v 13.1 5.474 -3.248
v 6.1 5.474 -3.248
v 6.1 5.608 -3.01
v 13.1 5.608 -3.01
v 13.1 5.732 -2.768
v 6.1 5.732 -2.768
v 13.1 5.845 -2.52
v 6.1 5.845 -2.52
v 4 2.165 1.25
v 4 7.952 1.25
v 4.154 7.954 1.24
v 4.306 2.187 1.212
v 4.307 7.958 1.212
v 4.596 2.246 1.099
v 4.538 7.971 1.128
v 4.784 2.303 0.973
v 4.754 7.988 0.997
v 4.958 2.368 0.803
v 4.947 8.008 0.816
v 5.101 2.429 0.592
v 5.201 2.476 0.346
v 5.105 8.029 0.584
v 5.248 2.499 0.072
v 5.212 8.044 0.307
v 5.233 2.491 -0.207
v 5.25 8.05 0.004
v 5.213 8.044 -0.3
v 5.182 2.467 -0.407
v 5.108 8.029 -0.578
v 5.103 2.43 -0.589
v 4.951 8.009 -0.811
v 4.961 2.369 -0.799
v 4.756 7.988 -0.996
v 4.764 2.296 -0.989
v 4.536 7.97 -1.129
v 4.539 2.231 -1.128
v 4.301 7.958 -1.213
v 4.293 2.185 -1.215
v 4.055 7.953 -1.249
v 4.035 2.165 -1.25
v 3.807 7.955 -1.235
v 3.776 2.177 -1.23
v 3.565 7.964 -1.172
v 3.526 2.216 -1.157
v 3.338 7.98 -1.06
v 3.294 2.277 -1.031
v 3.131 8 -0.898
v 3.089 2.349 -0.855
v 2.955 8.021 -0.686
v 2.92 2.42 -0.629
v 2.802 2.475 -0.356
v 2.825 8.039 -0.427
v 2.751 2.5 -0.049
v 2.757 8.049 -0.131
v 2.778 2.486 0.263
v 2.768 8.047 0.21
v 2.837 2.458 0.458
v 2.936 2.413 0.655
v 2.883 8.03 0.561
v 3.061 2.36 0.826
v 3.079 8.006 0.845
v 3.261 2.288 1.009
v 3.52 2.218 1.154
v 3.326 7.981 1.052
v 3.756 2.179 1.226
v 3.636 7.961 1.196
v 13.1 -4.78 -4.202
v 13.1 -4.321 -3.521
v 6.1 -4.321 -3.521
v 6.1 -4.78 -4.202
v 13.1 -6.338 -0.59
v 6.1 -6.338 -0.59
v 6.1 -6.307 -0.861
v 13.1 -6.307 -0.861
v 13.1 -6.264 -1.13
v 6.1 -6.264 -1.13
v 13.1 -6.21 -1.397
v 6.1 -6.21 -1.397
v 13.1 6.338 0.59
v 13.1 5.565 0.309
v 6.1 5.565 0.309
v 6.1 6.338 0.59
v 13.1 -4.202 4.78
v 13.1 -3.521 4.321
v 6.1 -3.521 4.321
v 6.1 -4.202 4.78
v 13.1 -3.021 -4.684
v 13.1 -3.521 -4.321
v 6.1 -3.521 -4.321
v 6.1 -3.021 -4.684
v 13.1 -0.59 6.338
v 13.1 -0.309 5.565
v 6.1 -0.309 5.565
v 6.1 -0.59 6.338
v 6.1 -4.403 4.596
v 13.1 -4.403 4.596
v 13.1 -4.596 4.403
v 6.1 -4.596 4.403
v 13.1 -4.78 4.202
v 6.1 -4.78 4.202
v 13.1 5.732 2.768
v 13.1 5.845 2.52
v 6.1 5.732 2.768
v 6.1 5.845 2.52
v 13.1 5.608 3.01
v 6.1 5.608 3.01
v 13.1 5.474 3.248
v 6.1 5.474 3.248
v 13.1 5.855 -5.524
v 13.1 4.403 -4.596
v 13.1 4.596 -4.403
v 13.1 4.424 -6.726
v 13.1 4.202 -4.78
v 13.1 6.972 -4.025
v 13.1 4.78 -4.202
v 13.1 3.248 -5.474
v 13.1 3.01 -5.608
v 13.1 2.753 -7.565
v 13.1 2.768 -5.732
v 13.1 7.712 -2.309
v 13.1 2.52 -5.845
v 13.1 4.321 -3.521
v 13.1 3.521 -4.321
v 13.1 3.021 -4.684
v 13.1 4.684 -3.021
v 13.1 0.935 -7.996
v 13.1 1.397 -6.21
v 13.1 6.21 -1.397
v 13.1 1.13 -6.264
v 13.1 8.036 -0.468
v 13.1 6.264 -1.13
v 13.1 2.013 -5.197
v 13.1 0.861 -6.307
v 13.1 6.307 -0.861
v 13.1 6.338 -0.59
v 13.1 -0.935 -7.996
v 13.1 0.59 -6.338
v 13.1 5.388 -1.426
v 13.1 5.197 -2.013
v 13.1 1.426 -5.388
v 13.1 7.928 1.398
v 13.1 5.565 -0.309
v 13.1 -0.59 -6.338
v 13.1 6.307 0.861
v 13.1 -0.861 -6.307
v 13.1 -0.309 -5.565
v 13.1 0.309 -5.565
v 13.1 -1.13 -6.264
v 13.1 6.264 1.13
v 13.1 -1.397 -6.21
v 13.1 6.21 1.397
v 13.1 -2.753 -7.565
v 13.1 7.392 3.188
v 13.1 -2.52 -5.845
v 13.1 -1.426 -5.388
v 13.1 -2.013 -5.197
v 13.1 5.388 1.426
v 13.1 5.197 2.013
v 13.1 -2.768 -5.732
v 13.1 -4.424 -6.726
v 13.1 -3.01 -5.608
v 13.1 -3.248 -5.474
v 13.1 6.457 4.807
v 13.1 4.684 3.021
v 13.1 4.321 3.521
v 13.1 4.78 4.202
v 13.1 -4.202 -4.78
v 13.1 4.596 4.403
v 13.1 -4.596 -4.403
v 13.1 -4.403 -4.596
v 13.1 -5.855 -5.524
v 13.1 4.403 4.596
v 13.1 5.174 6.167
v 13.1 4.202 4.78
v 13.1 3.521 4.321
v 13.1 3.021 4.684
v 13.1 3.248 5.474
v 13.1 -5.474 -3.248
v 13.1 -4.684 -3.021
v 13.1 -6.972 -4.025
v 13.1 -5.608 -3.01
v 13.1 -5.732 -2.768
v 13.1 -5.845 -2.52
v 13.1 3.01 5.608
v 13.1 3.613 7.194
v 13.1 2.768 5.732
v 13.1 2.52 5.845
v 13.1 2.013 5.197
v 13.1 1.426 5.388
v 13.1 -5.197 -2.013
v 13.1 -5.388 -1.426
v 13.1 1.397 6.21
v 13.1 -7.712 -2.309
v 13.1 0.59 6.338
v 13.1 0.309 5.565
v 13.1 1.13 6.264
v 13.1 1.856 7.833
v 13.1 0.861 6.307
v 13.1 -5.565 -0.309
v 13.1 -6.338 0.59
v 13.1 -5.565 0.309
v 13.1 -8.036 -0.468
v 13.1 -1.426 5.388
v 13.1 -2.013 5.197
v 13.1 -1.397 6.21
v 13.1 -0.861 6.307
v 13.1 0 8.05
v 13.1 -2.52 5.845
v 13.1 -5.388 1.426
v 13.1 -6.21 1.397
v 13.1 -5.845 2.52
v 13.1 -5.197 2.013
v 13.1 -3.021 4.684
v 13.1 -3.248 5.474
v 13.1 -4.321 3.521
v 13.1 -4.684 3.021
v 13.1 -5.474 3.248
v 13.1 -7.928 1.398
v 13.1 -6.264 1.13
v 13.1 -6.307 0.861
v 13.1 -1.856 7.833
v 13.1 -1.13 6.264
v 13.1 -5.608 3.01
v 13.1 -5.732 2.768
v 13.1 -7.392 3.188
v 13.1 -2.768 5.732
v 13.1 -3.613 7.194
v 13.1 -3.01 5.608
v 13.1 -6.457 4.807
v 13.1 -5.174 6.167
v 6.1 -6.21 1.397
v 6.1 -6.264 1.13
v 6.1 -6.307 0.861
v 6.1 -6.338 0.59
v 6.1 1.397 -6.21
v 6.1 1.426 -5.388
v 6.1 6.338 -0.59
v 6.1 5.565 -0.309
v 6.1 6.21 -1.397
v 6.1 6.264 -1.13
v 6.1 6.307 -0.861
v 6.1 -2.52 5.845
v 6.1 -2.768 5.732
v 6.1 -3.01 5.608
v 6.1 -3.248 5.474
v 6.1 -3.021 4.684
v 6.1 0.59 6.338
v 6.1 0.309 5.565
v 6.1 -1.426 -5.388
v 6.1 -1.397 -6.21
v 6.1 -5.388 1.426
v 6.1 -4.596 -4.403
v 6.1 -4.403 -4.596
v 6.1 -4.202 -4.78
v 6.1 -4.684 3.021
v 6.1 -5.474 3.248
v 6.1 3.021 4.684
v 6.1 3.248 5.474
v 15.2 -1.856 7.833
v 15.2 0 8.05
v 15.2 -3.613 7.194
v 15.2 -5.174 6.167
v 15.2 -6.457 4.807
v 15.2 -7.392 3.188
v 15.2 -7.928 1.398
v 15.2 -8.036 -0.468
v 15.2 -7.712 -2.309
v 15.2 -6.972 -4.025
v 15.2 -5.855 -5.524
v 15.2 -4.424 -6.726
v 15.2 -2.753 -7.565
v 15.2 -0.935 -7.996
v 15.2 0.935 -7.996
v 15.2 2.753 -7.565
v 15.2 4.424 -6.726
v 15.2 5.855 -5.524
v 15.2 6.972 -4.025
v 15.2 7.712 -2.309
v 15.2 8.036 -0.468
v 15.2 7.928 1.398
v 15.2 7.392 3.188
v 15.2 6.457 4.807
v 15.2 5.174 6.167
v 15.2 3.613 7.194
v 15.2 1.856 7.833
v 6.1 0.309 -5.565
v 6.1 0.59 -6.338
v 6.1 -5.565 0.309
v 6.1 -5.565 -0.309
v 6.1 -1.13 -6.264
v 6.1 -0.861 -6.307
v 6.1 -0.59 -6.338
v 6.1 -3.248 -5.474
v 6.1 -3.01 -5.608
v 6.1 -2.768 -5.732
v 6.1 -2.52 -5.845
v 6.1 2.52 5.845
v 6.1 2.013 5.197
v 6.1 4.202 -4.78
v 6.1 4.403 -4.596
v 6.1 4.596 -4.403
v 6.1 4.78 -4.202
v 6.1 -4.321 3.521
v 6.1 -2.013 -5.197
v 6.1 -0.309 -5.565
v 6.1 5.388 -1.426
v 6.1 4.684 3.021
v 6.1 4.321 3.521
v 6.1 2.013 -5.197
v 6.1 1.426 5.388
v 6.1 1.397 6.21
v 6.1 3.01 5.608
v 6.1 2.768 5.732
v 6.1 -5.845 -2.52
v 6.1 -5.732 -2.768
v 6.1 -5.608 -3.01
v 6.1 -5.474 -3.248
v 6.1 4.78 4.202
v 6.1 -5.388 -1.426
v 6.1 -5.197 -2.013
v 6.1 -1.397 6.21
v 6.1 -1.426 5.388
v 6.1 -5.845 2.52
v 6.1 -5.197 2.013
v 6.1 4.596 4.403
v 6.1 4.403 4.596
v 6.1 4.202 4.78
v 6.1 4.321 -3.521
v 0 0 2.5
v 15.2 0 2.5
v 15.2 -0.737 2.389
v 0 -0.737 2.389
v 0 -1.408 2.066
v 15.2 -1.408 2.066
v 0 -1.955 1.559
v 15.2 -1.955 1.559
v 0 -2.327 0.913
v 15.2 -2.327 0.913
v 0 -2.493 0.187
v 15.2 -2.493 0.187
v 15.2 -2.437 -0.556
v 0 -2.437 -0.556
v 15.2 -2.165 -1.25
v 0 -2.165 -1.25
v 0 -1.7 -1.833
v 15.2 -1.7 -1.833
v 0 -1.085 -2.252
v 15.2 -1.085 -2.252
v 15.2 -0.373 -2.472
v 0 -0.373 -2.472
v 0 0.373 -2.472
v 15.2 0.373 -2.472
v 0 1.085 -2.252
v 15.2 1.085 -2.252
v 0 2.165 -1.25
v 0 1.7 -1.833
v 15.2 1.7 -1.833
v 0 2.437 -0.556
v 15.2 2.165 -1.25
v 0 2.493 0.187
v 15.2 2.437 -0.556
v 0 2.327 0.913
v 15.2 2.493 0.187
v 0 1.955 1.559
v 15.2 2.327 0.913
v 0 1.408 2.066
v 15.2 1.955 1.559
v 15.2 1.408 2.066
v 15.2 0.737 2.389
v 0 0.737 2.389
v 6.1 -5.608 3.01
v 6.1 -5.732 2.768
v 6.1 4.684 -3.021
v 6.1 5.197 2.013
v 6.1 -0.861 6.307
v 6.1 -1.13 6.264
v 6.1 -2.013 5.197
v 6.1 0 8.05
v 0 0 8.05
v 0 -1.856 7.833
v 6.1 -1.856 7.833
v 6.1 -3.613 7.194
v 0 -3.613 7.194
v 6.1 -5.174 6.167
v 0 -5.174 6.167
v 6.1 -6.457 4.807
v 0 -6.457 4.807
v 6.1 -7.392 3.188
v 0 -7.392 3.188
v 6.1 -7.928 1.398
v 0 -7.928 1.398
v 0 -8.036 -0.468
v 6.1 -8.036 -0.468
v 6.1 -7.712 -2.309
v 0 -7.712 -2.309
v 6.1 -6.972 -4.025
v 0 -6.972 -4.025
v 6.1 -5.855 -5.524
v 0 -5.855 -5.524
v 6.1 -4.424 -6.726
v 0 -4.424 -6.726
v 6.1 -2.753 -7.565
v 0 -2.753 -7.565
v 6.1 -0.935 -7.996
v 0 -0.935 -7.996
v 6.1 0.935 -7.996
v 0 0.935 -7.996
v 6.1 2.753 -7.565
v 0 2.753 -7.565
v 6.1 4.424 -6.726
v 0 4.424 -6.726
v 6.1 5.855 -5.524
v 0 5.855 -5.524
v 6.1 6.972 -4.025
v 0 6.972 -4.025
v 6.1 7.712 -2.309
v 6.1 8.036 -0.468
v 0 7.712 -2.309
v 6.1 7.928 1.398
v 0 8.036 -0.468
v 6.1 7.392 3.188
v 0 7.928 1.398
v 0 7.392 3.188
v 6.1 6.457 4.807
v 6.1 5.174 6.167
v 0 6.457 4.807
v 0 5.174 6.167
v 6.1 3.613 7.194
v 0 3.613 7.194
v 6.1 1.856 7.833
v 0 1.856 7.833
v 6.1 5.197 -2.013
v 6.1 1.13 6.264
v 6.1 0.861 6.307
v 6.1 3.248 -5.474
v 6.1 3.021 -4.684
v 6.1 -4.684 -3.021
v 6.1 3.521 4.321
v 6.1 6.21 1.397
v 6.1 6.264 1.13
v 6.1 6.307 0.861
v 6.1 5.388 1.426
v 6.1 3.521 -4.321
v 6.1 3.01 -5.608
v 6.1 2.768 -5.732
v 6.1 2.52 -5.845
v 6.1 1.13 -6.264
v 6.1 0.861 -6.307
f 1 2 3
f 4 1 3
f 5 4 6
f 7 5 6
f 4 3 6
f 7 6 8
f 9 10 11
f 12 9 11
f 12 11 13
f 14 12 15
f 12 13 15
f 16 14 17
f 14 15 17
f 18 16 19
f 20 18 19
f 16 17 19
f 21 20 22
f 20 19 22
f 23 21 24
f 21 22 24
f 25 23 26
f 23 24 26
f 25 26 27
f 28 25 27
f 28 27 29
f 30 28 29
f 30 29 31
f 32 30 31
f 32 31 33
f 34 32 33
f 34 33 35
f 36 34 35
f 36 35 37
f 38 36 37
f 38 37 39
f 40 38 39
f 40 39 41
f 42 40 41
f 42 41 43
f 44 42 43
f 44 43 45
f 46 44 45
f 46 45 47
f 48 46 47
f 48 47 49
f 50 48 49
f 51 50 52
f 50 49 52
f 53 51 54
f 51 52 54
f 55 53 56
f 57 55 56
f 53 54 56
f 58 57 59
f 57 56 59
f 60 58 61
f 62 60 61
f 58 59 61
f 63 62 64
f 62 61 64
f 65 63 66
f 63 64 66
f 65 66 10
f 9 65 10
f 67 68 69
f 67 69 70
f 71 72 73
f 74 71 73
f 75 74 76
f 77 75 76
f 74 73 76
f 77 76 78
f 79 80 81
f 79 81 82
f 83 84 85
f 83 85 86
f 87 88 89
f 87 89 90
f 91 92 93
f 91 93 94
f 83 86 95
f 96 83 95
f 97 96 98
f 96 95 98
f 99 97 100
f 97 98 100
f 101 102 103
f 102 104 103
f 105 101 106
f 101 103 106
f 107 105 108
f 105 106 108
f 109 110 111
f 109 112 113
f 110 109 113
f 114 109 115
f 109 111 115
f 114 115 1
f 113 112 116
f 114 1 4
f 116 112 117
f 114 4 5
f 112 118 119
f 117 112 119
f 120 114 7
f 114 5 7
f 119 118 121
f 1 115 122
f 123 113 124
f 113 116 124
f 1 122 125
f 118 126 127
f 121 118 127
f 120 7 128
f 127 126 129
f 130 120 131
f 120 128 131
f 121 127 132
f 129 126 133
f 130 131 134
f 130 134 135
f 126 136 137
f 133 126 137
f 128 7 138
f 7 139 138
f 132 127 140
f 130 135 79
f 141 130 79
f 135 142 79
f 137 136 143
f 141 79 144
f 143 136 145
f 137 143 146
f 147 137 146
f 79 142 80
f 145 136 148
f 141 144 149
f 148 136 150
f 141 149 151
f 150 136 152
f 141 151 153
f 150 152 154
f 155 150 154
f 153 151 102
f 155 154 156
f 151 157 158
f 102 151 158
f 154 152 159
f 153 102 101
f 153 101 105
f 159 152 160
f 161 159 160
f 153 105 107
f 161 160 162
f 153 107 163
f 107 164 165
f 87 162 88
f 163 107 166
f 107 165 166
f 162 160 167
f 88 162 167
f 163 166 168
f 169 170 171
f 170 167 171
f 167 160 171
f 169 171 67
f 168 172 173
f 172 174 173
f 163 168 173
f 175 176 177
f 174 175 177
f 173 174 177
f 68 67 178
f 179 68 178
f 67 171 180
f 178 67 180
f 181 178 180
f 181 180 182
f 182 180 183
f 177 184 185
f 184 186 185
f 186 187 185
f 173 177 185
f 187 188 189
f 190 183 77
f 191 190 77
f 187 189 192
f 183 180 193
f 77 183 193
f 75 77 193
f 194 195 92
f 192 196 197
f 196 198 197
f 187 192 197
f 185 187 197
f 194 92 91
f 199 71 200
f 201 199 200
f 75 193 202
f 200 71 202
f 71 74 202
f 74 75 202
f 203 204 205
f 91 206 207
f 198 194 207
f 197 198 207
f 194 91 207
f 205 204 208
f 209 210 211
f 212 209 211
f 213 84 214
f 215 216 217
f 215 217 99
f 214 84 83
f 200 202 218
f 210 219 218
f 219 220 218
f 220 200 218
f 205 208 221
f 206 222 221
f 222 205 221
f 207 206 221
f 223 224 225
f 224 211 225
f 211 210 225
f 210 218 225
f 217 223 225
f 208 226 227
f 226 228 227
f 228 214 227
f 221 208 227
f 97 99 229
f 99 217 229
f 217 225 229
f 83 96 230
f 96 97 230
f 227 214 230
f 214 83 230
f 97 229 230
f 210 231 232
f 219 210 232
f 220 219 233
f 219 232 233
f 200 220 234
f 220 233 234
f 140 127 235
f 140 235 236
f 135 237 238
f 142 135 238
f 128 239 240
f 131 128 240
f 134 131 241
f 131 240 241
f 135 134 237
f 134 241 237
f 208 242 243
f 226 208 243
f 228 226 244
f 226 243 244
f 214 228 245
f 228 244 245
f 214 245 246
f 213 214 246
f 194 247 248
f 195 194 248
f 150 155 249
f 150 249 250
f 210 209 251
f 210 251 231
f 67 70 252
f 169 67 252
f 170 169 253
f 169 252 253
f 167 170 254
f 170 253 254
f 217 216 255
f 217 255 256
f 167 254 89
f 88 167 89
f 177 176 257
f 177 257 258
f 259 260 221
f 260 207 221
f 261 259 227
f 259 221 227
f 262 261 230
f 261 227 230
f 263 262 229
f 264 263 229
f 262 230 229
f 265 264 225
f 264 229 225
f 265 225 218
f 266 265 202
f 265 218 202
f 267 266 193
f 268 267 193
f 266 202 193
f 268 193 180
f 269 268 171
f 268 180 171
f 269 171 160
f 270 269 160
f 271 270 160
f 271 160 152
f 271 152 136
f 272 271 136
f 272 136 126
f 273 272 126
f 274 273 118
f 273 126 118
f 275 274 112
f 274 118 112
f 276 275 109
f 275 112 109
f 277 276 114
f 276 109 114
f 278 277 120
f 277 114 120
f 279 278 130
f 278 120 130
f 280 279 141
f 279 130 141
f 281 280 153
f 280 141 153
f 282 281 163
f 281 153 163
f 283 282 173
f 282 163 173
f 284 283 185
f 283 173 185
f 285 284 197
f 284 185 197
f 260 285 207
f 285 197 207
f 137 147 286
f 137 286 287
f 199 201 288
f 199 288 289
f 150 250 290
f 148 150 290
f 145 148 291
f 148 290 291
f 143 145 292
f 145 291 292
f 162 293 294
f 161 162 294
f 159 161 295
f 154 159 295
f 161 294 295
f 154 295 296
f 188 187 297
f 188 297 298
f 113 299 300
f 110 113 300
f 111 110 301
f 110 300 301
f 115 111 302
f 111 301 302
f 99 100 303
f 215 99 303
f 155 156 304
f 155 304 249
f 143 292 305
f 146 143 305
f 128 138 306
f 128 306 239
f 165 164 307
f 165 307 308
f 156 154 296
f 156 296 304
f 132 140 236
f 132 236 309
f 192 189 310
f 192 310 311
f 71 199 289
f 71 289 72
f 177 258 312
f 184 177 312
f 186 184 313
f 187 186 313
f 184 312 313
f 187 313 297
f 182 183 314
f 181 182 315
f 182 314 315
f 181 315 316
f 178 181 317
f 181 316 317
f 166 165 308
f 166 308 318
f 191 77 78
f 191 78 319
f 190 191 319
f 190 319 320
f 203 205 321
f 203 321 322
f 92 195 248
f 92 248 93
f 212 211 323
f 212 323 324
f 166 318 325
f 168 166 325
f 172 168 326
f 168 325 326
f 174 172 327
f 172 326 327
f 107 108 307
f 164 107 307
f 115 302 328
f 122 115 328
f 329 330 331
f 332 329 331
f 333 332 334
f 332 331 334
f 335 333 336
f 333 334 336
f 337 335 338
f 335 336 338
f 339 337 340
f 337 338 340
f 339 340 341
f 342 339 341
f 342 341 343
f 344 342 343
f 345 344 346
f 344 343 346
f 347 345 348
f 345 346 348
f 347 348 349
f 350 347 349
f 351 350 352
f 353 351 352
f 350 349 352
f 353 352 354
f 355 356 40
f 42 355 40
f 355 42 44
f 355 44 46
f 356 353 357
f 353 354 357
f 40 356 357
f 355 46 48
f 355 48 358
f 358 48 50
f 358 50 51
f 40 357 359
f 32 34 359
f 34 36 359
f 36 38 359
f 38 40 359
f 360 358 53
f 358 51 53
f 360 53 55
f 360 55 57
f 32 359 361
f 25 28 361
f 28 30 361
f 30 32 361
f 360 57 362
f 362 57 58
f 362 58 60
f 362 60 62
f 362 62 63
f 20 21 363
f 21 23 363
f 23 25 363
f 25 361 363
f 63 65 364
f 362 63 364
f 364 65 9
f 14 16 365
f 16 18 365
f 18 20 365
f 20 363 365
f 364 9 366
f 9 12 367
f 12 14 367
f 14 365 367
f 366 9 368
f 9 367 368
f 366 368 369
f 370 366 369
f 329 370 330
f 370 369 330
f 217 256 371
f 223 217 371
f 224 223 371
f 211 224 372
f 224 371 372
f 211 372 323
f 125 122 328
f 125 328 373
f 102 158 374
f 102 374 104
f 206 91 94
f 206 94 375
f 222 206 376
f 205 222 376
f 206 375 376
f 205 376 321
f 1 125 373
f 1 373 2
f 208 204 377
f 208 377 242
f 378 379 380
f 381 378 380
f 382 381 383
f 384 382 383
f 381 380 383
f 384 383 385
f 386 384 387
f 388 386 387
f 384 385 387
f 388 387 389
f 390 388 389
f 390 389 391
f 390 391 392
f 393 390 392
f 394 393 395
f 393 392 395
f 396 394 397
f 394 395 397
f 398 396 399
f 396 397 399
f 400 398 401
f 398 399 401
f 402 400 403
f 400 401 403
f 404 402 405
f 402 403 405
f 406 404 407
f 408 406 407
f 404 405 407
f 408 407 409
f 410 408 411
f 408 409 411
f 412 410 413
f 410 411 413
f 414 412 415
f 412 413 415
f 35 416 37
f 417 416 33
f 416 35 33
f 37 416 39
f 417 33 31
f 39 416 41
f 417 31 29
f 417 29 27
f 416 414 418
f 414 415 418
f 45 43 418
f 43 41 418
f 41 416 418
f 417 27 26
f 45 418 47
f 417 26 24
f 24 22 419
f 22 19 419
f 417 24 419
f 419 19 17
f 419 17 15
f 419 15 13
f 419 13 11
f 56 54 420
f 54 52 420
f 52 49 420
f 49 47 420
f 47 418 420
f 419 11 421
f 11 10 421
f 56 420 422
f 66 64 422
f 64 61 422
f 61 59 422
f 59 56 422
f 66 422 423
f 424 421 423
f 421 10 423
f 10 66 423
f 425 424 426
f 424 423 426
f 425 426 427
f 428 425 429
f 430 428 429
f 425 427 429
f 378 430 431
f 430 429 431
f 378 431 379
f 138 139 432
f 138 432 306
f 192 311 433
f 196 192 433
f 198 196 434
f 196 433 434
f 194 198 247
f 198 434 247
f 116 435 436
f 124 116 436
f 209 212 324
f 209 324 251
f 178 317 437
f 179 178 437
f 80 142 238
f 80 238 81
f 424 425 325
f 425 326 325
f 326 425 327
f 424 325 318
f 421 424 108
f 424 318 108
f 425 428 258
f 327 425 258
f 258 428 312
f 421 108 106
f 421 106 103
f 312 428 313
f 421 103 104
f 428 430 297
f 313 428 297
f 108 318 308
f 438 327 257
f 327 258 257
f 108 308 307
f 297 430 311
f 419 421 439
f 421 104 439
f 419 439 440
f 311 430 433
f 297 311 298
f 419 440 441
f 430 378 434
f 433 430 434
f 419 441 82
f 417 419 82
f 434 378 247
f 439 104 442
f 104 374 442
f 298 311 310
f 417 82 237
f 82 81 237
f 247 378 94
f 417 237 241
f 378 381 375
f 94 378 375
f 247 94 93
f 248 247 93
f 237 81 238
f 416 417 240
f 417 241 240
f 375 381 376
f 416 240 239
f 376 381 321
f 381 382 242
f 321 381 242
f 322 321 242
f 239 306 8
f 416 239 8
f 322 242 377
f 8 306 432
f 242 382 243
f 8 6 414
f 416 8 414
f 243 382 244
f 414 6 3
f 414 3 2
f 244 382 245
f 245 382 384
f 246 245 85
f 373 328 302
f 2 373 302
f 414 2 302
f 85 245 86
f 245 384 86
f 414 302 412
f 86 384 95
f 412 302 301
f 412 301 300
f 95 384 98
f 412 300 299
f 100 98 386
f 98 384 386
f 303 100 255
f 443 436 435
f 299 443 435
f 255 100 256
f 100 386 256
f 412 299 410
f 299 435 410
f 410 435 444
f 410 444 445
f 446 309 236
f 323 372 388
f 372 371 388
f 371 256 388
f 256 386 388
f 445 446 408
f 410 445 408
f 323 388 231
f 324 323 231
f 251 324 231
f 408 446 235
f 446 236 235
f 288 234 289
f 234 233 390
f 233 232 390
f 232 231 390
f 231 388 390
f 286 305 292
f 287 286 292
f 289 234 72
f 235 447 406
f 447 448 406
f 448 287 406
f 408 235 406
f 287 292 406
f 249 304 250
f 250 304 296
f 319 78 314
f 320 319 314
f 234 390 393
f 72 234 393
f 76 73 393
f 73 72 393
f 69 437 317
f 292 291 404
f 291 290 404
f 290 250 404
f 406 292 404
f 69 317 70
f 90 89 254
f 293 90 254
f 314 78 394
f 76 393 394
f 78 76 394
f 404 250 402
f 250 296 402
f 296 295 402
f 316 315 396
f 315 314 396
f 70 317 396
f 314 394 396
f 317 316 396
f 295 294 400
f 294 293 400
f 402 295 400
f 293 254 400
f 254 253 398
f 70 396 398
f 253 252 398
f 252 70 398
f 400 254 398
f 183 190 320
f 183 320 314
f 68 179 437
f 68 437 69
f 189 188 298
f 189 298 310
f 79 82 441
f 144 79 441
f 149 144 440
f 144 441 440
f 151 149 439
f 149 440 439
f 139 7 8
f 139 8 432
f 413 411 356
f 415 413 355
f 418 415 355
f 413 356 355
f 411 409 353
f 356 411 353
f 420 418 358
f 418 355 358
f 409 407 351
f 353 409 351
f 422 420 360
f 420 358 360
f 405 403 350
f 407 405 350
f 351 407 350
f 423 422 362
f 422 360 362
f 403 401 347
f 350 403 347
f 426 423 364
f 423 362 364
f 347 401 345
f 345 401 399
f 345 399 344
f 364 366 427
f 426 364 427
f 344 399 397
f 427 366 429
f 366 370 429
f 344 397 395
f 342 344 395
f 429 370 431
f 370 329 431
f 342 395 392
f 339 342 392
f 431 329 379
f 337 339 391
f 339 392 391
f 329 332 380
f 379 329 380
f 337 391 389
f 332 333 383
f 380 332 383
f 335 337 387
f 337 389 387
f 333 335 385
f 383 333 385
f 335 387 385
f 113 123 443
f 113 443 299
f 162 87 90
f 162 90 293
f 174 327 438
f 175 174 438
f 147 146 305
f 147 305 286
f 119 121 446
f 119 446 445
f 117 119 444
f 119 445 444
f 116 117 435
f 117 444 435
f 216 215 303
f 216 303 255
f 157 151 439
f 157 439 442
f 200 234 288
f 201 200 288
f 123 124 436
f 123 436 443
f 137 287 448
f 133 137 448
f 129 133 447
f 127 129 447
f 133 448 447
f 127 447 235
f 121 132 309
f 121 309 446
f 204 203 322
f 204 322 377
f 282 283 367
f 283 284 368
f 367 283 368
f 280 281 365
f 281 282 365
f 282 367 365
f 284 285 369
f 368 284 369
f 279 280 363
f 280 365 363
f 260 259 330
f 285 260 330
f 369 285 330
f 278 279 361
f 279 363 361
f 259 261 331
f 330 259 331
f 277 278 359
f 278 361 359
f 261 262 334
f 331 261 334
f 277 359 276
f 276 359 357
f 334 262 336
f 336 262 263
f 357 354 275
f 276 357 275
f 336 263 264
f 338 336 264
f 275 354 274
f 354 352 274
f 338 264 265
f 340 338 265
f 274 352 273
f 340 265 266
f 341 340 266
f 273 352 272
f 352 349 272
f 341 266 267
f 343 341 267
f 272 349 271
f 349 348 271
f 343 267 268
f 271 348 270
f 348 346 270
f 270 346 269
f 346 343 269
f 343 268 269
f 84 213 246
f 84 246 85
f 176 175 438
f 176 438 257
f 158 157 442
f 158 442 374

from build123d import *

# Parameters (mm, degrees)
M3_TAPPED_HOLE1_REACH  = 23.2
M3_TAPPED_HOLE1_BORE_R = 1.25
CUT_EXTRUDE1_DEPTH     = 7
CIRPATTERN1_COUNT      = 20


with BuildPart() as part:
    # Sketch1 → Revolve1 (revolve)
    with BuildSketch(Plane.XY, mode=Mode.PRIVATE) as revolve1_sk:
        Polygon((0, 2.5), (15.2, 2.5), (15.2, 8.05), (13.1, 8.05), (13.1, 6.365), (6.1, 6.365), (6.1, 8.05), (0, 8.05), align=None)
    revolve(revolve1_sk.sketch.rotate(Axis((0, 0, 0), (1, 0, 0)), 90), axis=Axis((0, 0, 0), (1, 0, 0)))

    # M3 Tapped Hole1 bore (on position points) → M3 Tapped Hole1 (cut, up to next)
    with BuildSketch(Plane(origin=(4, 8.05, 0), x_dir=(0, 0, 1), z_dir=(0, 1, 0)), mode=Mode.PRIVATE) as m3_tapped_hole1_sk1:
        Circle(M3_TAPPED_HOLE1_BORE_R)
    m3_tapped_hole1_tool1 = extrude(m3_tapped_hole1_sk1.sketch, amount=-M3_TAPPED_HOLE1_REACH, mode=Mode.PRIVATE) & part.part
    add(m3_tapped_hole1_tool1.solids().sort_by_distance((4, 8.05, 0))[0], mode=Mode.SUBTRACT)

    # Sketch3 → Cut-Extrude1 (cut)
    with BuildSketch(Plane.ZY.offset(-13.1)):
        Polygon((-0.6, 6.365), (-0.308823813, 5.565), (0.308823813, 5.565), (0.6, 6.365), align=None)
    cut_extrude1 = extrude(amount=CUT_EXTRUDE1_DEPTH, mode=Mode.SUBTRACT)

    # CirPattern1: Cut-Extrude1 ×20 about axis
    cirpattern1_axis = Axis((0, 0, 0), (1, 0, 0))
    for i in range(1, CIRPATTERN1_COUNT):
        add(cut_extrude1.rotate(cirpattern1_axis, i * 360 / CIRPATTERN1_COUNT), mode=Mode.SUBTRACT)


solid = part.part
